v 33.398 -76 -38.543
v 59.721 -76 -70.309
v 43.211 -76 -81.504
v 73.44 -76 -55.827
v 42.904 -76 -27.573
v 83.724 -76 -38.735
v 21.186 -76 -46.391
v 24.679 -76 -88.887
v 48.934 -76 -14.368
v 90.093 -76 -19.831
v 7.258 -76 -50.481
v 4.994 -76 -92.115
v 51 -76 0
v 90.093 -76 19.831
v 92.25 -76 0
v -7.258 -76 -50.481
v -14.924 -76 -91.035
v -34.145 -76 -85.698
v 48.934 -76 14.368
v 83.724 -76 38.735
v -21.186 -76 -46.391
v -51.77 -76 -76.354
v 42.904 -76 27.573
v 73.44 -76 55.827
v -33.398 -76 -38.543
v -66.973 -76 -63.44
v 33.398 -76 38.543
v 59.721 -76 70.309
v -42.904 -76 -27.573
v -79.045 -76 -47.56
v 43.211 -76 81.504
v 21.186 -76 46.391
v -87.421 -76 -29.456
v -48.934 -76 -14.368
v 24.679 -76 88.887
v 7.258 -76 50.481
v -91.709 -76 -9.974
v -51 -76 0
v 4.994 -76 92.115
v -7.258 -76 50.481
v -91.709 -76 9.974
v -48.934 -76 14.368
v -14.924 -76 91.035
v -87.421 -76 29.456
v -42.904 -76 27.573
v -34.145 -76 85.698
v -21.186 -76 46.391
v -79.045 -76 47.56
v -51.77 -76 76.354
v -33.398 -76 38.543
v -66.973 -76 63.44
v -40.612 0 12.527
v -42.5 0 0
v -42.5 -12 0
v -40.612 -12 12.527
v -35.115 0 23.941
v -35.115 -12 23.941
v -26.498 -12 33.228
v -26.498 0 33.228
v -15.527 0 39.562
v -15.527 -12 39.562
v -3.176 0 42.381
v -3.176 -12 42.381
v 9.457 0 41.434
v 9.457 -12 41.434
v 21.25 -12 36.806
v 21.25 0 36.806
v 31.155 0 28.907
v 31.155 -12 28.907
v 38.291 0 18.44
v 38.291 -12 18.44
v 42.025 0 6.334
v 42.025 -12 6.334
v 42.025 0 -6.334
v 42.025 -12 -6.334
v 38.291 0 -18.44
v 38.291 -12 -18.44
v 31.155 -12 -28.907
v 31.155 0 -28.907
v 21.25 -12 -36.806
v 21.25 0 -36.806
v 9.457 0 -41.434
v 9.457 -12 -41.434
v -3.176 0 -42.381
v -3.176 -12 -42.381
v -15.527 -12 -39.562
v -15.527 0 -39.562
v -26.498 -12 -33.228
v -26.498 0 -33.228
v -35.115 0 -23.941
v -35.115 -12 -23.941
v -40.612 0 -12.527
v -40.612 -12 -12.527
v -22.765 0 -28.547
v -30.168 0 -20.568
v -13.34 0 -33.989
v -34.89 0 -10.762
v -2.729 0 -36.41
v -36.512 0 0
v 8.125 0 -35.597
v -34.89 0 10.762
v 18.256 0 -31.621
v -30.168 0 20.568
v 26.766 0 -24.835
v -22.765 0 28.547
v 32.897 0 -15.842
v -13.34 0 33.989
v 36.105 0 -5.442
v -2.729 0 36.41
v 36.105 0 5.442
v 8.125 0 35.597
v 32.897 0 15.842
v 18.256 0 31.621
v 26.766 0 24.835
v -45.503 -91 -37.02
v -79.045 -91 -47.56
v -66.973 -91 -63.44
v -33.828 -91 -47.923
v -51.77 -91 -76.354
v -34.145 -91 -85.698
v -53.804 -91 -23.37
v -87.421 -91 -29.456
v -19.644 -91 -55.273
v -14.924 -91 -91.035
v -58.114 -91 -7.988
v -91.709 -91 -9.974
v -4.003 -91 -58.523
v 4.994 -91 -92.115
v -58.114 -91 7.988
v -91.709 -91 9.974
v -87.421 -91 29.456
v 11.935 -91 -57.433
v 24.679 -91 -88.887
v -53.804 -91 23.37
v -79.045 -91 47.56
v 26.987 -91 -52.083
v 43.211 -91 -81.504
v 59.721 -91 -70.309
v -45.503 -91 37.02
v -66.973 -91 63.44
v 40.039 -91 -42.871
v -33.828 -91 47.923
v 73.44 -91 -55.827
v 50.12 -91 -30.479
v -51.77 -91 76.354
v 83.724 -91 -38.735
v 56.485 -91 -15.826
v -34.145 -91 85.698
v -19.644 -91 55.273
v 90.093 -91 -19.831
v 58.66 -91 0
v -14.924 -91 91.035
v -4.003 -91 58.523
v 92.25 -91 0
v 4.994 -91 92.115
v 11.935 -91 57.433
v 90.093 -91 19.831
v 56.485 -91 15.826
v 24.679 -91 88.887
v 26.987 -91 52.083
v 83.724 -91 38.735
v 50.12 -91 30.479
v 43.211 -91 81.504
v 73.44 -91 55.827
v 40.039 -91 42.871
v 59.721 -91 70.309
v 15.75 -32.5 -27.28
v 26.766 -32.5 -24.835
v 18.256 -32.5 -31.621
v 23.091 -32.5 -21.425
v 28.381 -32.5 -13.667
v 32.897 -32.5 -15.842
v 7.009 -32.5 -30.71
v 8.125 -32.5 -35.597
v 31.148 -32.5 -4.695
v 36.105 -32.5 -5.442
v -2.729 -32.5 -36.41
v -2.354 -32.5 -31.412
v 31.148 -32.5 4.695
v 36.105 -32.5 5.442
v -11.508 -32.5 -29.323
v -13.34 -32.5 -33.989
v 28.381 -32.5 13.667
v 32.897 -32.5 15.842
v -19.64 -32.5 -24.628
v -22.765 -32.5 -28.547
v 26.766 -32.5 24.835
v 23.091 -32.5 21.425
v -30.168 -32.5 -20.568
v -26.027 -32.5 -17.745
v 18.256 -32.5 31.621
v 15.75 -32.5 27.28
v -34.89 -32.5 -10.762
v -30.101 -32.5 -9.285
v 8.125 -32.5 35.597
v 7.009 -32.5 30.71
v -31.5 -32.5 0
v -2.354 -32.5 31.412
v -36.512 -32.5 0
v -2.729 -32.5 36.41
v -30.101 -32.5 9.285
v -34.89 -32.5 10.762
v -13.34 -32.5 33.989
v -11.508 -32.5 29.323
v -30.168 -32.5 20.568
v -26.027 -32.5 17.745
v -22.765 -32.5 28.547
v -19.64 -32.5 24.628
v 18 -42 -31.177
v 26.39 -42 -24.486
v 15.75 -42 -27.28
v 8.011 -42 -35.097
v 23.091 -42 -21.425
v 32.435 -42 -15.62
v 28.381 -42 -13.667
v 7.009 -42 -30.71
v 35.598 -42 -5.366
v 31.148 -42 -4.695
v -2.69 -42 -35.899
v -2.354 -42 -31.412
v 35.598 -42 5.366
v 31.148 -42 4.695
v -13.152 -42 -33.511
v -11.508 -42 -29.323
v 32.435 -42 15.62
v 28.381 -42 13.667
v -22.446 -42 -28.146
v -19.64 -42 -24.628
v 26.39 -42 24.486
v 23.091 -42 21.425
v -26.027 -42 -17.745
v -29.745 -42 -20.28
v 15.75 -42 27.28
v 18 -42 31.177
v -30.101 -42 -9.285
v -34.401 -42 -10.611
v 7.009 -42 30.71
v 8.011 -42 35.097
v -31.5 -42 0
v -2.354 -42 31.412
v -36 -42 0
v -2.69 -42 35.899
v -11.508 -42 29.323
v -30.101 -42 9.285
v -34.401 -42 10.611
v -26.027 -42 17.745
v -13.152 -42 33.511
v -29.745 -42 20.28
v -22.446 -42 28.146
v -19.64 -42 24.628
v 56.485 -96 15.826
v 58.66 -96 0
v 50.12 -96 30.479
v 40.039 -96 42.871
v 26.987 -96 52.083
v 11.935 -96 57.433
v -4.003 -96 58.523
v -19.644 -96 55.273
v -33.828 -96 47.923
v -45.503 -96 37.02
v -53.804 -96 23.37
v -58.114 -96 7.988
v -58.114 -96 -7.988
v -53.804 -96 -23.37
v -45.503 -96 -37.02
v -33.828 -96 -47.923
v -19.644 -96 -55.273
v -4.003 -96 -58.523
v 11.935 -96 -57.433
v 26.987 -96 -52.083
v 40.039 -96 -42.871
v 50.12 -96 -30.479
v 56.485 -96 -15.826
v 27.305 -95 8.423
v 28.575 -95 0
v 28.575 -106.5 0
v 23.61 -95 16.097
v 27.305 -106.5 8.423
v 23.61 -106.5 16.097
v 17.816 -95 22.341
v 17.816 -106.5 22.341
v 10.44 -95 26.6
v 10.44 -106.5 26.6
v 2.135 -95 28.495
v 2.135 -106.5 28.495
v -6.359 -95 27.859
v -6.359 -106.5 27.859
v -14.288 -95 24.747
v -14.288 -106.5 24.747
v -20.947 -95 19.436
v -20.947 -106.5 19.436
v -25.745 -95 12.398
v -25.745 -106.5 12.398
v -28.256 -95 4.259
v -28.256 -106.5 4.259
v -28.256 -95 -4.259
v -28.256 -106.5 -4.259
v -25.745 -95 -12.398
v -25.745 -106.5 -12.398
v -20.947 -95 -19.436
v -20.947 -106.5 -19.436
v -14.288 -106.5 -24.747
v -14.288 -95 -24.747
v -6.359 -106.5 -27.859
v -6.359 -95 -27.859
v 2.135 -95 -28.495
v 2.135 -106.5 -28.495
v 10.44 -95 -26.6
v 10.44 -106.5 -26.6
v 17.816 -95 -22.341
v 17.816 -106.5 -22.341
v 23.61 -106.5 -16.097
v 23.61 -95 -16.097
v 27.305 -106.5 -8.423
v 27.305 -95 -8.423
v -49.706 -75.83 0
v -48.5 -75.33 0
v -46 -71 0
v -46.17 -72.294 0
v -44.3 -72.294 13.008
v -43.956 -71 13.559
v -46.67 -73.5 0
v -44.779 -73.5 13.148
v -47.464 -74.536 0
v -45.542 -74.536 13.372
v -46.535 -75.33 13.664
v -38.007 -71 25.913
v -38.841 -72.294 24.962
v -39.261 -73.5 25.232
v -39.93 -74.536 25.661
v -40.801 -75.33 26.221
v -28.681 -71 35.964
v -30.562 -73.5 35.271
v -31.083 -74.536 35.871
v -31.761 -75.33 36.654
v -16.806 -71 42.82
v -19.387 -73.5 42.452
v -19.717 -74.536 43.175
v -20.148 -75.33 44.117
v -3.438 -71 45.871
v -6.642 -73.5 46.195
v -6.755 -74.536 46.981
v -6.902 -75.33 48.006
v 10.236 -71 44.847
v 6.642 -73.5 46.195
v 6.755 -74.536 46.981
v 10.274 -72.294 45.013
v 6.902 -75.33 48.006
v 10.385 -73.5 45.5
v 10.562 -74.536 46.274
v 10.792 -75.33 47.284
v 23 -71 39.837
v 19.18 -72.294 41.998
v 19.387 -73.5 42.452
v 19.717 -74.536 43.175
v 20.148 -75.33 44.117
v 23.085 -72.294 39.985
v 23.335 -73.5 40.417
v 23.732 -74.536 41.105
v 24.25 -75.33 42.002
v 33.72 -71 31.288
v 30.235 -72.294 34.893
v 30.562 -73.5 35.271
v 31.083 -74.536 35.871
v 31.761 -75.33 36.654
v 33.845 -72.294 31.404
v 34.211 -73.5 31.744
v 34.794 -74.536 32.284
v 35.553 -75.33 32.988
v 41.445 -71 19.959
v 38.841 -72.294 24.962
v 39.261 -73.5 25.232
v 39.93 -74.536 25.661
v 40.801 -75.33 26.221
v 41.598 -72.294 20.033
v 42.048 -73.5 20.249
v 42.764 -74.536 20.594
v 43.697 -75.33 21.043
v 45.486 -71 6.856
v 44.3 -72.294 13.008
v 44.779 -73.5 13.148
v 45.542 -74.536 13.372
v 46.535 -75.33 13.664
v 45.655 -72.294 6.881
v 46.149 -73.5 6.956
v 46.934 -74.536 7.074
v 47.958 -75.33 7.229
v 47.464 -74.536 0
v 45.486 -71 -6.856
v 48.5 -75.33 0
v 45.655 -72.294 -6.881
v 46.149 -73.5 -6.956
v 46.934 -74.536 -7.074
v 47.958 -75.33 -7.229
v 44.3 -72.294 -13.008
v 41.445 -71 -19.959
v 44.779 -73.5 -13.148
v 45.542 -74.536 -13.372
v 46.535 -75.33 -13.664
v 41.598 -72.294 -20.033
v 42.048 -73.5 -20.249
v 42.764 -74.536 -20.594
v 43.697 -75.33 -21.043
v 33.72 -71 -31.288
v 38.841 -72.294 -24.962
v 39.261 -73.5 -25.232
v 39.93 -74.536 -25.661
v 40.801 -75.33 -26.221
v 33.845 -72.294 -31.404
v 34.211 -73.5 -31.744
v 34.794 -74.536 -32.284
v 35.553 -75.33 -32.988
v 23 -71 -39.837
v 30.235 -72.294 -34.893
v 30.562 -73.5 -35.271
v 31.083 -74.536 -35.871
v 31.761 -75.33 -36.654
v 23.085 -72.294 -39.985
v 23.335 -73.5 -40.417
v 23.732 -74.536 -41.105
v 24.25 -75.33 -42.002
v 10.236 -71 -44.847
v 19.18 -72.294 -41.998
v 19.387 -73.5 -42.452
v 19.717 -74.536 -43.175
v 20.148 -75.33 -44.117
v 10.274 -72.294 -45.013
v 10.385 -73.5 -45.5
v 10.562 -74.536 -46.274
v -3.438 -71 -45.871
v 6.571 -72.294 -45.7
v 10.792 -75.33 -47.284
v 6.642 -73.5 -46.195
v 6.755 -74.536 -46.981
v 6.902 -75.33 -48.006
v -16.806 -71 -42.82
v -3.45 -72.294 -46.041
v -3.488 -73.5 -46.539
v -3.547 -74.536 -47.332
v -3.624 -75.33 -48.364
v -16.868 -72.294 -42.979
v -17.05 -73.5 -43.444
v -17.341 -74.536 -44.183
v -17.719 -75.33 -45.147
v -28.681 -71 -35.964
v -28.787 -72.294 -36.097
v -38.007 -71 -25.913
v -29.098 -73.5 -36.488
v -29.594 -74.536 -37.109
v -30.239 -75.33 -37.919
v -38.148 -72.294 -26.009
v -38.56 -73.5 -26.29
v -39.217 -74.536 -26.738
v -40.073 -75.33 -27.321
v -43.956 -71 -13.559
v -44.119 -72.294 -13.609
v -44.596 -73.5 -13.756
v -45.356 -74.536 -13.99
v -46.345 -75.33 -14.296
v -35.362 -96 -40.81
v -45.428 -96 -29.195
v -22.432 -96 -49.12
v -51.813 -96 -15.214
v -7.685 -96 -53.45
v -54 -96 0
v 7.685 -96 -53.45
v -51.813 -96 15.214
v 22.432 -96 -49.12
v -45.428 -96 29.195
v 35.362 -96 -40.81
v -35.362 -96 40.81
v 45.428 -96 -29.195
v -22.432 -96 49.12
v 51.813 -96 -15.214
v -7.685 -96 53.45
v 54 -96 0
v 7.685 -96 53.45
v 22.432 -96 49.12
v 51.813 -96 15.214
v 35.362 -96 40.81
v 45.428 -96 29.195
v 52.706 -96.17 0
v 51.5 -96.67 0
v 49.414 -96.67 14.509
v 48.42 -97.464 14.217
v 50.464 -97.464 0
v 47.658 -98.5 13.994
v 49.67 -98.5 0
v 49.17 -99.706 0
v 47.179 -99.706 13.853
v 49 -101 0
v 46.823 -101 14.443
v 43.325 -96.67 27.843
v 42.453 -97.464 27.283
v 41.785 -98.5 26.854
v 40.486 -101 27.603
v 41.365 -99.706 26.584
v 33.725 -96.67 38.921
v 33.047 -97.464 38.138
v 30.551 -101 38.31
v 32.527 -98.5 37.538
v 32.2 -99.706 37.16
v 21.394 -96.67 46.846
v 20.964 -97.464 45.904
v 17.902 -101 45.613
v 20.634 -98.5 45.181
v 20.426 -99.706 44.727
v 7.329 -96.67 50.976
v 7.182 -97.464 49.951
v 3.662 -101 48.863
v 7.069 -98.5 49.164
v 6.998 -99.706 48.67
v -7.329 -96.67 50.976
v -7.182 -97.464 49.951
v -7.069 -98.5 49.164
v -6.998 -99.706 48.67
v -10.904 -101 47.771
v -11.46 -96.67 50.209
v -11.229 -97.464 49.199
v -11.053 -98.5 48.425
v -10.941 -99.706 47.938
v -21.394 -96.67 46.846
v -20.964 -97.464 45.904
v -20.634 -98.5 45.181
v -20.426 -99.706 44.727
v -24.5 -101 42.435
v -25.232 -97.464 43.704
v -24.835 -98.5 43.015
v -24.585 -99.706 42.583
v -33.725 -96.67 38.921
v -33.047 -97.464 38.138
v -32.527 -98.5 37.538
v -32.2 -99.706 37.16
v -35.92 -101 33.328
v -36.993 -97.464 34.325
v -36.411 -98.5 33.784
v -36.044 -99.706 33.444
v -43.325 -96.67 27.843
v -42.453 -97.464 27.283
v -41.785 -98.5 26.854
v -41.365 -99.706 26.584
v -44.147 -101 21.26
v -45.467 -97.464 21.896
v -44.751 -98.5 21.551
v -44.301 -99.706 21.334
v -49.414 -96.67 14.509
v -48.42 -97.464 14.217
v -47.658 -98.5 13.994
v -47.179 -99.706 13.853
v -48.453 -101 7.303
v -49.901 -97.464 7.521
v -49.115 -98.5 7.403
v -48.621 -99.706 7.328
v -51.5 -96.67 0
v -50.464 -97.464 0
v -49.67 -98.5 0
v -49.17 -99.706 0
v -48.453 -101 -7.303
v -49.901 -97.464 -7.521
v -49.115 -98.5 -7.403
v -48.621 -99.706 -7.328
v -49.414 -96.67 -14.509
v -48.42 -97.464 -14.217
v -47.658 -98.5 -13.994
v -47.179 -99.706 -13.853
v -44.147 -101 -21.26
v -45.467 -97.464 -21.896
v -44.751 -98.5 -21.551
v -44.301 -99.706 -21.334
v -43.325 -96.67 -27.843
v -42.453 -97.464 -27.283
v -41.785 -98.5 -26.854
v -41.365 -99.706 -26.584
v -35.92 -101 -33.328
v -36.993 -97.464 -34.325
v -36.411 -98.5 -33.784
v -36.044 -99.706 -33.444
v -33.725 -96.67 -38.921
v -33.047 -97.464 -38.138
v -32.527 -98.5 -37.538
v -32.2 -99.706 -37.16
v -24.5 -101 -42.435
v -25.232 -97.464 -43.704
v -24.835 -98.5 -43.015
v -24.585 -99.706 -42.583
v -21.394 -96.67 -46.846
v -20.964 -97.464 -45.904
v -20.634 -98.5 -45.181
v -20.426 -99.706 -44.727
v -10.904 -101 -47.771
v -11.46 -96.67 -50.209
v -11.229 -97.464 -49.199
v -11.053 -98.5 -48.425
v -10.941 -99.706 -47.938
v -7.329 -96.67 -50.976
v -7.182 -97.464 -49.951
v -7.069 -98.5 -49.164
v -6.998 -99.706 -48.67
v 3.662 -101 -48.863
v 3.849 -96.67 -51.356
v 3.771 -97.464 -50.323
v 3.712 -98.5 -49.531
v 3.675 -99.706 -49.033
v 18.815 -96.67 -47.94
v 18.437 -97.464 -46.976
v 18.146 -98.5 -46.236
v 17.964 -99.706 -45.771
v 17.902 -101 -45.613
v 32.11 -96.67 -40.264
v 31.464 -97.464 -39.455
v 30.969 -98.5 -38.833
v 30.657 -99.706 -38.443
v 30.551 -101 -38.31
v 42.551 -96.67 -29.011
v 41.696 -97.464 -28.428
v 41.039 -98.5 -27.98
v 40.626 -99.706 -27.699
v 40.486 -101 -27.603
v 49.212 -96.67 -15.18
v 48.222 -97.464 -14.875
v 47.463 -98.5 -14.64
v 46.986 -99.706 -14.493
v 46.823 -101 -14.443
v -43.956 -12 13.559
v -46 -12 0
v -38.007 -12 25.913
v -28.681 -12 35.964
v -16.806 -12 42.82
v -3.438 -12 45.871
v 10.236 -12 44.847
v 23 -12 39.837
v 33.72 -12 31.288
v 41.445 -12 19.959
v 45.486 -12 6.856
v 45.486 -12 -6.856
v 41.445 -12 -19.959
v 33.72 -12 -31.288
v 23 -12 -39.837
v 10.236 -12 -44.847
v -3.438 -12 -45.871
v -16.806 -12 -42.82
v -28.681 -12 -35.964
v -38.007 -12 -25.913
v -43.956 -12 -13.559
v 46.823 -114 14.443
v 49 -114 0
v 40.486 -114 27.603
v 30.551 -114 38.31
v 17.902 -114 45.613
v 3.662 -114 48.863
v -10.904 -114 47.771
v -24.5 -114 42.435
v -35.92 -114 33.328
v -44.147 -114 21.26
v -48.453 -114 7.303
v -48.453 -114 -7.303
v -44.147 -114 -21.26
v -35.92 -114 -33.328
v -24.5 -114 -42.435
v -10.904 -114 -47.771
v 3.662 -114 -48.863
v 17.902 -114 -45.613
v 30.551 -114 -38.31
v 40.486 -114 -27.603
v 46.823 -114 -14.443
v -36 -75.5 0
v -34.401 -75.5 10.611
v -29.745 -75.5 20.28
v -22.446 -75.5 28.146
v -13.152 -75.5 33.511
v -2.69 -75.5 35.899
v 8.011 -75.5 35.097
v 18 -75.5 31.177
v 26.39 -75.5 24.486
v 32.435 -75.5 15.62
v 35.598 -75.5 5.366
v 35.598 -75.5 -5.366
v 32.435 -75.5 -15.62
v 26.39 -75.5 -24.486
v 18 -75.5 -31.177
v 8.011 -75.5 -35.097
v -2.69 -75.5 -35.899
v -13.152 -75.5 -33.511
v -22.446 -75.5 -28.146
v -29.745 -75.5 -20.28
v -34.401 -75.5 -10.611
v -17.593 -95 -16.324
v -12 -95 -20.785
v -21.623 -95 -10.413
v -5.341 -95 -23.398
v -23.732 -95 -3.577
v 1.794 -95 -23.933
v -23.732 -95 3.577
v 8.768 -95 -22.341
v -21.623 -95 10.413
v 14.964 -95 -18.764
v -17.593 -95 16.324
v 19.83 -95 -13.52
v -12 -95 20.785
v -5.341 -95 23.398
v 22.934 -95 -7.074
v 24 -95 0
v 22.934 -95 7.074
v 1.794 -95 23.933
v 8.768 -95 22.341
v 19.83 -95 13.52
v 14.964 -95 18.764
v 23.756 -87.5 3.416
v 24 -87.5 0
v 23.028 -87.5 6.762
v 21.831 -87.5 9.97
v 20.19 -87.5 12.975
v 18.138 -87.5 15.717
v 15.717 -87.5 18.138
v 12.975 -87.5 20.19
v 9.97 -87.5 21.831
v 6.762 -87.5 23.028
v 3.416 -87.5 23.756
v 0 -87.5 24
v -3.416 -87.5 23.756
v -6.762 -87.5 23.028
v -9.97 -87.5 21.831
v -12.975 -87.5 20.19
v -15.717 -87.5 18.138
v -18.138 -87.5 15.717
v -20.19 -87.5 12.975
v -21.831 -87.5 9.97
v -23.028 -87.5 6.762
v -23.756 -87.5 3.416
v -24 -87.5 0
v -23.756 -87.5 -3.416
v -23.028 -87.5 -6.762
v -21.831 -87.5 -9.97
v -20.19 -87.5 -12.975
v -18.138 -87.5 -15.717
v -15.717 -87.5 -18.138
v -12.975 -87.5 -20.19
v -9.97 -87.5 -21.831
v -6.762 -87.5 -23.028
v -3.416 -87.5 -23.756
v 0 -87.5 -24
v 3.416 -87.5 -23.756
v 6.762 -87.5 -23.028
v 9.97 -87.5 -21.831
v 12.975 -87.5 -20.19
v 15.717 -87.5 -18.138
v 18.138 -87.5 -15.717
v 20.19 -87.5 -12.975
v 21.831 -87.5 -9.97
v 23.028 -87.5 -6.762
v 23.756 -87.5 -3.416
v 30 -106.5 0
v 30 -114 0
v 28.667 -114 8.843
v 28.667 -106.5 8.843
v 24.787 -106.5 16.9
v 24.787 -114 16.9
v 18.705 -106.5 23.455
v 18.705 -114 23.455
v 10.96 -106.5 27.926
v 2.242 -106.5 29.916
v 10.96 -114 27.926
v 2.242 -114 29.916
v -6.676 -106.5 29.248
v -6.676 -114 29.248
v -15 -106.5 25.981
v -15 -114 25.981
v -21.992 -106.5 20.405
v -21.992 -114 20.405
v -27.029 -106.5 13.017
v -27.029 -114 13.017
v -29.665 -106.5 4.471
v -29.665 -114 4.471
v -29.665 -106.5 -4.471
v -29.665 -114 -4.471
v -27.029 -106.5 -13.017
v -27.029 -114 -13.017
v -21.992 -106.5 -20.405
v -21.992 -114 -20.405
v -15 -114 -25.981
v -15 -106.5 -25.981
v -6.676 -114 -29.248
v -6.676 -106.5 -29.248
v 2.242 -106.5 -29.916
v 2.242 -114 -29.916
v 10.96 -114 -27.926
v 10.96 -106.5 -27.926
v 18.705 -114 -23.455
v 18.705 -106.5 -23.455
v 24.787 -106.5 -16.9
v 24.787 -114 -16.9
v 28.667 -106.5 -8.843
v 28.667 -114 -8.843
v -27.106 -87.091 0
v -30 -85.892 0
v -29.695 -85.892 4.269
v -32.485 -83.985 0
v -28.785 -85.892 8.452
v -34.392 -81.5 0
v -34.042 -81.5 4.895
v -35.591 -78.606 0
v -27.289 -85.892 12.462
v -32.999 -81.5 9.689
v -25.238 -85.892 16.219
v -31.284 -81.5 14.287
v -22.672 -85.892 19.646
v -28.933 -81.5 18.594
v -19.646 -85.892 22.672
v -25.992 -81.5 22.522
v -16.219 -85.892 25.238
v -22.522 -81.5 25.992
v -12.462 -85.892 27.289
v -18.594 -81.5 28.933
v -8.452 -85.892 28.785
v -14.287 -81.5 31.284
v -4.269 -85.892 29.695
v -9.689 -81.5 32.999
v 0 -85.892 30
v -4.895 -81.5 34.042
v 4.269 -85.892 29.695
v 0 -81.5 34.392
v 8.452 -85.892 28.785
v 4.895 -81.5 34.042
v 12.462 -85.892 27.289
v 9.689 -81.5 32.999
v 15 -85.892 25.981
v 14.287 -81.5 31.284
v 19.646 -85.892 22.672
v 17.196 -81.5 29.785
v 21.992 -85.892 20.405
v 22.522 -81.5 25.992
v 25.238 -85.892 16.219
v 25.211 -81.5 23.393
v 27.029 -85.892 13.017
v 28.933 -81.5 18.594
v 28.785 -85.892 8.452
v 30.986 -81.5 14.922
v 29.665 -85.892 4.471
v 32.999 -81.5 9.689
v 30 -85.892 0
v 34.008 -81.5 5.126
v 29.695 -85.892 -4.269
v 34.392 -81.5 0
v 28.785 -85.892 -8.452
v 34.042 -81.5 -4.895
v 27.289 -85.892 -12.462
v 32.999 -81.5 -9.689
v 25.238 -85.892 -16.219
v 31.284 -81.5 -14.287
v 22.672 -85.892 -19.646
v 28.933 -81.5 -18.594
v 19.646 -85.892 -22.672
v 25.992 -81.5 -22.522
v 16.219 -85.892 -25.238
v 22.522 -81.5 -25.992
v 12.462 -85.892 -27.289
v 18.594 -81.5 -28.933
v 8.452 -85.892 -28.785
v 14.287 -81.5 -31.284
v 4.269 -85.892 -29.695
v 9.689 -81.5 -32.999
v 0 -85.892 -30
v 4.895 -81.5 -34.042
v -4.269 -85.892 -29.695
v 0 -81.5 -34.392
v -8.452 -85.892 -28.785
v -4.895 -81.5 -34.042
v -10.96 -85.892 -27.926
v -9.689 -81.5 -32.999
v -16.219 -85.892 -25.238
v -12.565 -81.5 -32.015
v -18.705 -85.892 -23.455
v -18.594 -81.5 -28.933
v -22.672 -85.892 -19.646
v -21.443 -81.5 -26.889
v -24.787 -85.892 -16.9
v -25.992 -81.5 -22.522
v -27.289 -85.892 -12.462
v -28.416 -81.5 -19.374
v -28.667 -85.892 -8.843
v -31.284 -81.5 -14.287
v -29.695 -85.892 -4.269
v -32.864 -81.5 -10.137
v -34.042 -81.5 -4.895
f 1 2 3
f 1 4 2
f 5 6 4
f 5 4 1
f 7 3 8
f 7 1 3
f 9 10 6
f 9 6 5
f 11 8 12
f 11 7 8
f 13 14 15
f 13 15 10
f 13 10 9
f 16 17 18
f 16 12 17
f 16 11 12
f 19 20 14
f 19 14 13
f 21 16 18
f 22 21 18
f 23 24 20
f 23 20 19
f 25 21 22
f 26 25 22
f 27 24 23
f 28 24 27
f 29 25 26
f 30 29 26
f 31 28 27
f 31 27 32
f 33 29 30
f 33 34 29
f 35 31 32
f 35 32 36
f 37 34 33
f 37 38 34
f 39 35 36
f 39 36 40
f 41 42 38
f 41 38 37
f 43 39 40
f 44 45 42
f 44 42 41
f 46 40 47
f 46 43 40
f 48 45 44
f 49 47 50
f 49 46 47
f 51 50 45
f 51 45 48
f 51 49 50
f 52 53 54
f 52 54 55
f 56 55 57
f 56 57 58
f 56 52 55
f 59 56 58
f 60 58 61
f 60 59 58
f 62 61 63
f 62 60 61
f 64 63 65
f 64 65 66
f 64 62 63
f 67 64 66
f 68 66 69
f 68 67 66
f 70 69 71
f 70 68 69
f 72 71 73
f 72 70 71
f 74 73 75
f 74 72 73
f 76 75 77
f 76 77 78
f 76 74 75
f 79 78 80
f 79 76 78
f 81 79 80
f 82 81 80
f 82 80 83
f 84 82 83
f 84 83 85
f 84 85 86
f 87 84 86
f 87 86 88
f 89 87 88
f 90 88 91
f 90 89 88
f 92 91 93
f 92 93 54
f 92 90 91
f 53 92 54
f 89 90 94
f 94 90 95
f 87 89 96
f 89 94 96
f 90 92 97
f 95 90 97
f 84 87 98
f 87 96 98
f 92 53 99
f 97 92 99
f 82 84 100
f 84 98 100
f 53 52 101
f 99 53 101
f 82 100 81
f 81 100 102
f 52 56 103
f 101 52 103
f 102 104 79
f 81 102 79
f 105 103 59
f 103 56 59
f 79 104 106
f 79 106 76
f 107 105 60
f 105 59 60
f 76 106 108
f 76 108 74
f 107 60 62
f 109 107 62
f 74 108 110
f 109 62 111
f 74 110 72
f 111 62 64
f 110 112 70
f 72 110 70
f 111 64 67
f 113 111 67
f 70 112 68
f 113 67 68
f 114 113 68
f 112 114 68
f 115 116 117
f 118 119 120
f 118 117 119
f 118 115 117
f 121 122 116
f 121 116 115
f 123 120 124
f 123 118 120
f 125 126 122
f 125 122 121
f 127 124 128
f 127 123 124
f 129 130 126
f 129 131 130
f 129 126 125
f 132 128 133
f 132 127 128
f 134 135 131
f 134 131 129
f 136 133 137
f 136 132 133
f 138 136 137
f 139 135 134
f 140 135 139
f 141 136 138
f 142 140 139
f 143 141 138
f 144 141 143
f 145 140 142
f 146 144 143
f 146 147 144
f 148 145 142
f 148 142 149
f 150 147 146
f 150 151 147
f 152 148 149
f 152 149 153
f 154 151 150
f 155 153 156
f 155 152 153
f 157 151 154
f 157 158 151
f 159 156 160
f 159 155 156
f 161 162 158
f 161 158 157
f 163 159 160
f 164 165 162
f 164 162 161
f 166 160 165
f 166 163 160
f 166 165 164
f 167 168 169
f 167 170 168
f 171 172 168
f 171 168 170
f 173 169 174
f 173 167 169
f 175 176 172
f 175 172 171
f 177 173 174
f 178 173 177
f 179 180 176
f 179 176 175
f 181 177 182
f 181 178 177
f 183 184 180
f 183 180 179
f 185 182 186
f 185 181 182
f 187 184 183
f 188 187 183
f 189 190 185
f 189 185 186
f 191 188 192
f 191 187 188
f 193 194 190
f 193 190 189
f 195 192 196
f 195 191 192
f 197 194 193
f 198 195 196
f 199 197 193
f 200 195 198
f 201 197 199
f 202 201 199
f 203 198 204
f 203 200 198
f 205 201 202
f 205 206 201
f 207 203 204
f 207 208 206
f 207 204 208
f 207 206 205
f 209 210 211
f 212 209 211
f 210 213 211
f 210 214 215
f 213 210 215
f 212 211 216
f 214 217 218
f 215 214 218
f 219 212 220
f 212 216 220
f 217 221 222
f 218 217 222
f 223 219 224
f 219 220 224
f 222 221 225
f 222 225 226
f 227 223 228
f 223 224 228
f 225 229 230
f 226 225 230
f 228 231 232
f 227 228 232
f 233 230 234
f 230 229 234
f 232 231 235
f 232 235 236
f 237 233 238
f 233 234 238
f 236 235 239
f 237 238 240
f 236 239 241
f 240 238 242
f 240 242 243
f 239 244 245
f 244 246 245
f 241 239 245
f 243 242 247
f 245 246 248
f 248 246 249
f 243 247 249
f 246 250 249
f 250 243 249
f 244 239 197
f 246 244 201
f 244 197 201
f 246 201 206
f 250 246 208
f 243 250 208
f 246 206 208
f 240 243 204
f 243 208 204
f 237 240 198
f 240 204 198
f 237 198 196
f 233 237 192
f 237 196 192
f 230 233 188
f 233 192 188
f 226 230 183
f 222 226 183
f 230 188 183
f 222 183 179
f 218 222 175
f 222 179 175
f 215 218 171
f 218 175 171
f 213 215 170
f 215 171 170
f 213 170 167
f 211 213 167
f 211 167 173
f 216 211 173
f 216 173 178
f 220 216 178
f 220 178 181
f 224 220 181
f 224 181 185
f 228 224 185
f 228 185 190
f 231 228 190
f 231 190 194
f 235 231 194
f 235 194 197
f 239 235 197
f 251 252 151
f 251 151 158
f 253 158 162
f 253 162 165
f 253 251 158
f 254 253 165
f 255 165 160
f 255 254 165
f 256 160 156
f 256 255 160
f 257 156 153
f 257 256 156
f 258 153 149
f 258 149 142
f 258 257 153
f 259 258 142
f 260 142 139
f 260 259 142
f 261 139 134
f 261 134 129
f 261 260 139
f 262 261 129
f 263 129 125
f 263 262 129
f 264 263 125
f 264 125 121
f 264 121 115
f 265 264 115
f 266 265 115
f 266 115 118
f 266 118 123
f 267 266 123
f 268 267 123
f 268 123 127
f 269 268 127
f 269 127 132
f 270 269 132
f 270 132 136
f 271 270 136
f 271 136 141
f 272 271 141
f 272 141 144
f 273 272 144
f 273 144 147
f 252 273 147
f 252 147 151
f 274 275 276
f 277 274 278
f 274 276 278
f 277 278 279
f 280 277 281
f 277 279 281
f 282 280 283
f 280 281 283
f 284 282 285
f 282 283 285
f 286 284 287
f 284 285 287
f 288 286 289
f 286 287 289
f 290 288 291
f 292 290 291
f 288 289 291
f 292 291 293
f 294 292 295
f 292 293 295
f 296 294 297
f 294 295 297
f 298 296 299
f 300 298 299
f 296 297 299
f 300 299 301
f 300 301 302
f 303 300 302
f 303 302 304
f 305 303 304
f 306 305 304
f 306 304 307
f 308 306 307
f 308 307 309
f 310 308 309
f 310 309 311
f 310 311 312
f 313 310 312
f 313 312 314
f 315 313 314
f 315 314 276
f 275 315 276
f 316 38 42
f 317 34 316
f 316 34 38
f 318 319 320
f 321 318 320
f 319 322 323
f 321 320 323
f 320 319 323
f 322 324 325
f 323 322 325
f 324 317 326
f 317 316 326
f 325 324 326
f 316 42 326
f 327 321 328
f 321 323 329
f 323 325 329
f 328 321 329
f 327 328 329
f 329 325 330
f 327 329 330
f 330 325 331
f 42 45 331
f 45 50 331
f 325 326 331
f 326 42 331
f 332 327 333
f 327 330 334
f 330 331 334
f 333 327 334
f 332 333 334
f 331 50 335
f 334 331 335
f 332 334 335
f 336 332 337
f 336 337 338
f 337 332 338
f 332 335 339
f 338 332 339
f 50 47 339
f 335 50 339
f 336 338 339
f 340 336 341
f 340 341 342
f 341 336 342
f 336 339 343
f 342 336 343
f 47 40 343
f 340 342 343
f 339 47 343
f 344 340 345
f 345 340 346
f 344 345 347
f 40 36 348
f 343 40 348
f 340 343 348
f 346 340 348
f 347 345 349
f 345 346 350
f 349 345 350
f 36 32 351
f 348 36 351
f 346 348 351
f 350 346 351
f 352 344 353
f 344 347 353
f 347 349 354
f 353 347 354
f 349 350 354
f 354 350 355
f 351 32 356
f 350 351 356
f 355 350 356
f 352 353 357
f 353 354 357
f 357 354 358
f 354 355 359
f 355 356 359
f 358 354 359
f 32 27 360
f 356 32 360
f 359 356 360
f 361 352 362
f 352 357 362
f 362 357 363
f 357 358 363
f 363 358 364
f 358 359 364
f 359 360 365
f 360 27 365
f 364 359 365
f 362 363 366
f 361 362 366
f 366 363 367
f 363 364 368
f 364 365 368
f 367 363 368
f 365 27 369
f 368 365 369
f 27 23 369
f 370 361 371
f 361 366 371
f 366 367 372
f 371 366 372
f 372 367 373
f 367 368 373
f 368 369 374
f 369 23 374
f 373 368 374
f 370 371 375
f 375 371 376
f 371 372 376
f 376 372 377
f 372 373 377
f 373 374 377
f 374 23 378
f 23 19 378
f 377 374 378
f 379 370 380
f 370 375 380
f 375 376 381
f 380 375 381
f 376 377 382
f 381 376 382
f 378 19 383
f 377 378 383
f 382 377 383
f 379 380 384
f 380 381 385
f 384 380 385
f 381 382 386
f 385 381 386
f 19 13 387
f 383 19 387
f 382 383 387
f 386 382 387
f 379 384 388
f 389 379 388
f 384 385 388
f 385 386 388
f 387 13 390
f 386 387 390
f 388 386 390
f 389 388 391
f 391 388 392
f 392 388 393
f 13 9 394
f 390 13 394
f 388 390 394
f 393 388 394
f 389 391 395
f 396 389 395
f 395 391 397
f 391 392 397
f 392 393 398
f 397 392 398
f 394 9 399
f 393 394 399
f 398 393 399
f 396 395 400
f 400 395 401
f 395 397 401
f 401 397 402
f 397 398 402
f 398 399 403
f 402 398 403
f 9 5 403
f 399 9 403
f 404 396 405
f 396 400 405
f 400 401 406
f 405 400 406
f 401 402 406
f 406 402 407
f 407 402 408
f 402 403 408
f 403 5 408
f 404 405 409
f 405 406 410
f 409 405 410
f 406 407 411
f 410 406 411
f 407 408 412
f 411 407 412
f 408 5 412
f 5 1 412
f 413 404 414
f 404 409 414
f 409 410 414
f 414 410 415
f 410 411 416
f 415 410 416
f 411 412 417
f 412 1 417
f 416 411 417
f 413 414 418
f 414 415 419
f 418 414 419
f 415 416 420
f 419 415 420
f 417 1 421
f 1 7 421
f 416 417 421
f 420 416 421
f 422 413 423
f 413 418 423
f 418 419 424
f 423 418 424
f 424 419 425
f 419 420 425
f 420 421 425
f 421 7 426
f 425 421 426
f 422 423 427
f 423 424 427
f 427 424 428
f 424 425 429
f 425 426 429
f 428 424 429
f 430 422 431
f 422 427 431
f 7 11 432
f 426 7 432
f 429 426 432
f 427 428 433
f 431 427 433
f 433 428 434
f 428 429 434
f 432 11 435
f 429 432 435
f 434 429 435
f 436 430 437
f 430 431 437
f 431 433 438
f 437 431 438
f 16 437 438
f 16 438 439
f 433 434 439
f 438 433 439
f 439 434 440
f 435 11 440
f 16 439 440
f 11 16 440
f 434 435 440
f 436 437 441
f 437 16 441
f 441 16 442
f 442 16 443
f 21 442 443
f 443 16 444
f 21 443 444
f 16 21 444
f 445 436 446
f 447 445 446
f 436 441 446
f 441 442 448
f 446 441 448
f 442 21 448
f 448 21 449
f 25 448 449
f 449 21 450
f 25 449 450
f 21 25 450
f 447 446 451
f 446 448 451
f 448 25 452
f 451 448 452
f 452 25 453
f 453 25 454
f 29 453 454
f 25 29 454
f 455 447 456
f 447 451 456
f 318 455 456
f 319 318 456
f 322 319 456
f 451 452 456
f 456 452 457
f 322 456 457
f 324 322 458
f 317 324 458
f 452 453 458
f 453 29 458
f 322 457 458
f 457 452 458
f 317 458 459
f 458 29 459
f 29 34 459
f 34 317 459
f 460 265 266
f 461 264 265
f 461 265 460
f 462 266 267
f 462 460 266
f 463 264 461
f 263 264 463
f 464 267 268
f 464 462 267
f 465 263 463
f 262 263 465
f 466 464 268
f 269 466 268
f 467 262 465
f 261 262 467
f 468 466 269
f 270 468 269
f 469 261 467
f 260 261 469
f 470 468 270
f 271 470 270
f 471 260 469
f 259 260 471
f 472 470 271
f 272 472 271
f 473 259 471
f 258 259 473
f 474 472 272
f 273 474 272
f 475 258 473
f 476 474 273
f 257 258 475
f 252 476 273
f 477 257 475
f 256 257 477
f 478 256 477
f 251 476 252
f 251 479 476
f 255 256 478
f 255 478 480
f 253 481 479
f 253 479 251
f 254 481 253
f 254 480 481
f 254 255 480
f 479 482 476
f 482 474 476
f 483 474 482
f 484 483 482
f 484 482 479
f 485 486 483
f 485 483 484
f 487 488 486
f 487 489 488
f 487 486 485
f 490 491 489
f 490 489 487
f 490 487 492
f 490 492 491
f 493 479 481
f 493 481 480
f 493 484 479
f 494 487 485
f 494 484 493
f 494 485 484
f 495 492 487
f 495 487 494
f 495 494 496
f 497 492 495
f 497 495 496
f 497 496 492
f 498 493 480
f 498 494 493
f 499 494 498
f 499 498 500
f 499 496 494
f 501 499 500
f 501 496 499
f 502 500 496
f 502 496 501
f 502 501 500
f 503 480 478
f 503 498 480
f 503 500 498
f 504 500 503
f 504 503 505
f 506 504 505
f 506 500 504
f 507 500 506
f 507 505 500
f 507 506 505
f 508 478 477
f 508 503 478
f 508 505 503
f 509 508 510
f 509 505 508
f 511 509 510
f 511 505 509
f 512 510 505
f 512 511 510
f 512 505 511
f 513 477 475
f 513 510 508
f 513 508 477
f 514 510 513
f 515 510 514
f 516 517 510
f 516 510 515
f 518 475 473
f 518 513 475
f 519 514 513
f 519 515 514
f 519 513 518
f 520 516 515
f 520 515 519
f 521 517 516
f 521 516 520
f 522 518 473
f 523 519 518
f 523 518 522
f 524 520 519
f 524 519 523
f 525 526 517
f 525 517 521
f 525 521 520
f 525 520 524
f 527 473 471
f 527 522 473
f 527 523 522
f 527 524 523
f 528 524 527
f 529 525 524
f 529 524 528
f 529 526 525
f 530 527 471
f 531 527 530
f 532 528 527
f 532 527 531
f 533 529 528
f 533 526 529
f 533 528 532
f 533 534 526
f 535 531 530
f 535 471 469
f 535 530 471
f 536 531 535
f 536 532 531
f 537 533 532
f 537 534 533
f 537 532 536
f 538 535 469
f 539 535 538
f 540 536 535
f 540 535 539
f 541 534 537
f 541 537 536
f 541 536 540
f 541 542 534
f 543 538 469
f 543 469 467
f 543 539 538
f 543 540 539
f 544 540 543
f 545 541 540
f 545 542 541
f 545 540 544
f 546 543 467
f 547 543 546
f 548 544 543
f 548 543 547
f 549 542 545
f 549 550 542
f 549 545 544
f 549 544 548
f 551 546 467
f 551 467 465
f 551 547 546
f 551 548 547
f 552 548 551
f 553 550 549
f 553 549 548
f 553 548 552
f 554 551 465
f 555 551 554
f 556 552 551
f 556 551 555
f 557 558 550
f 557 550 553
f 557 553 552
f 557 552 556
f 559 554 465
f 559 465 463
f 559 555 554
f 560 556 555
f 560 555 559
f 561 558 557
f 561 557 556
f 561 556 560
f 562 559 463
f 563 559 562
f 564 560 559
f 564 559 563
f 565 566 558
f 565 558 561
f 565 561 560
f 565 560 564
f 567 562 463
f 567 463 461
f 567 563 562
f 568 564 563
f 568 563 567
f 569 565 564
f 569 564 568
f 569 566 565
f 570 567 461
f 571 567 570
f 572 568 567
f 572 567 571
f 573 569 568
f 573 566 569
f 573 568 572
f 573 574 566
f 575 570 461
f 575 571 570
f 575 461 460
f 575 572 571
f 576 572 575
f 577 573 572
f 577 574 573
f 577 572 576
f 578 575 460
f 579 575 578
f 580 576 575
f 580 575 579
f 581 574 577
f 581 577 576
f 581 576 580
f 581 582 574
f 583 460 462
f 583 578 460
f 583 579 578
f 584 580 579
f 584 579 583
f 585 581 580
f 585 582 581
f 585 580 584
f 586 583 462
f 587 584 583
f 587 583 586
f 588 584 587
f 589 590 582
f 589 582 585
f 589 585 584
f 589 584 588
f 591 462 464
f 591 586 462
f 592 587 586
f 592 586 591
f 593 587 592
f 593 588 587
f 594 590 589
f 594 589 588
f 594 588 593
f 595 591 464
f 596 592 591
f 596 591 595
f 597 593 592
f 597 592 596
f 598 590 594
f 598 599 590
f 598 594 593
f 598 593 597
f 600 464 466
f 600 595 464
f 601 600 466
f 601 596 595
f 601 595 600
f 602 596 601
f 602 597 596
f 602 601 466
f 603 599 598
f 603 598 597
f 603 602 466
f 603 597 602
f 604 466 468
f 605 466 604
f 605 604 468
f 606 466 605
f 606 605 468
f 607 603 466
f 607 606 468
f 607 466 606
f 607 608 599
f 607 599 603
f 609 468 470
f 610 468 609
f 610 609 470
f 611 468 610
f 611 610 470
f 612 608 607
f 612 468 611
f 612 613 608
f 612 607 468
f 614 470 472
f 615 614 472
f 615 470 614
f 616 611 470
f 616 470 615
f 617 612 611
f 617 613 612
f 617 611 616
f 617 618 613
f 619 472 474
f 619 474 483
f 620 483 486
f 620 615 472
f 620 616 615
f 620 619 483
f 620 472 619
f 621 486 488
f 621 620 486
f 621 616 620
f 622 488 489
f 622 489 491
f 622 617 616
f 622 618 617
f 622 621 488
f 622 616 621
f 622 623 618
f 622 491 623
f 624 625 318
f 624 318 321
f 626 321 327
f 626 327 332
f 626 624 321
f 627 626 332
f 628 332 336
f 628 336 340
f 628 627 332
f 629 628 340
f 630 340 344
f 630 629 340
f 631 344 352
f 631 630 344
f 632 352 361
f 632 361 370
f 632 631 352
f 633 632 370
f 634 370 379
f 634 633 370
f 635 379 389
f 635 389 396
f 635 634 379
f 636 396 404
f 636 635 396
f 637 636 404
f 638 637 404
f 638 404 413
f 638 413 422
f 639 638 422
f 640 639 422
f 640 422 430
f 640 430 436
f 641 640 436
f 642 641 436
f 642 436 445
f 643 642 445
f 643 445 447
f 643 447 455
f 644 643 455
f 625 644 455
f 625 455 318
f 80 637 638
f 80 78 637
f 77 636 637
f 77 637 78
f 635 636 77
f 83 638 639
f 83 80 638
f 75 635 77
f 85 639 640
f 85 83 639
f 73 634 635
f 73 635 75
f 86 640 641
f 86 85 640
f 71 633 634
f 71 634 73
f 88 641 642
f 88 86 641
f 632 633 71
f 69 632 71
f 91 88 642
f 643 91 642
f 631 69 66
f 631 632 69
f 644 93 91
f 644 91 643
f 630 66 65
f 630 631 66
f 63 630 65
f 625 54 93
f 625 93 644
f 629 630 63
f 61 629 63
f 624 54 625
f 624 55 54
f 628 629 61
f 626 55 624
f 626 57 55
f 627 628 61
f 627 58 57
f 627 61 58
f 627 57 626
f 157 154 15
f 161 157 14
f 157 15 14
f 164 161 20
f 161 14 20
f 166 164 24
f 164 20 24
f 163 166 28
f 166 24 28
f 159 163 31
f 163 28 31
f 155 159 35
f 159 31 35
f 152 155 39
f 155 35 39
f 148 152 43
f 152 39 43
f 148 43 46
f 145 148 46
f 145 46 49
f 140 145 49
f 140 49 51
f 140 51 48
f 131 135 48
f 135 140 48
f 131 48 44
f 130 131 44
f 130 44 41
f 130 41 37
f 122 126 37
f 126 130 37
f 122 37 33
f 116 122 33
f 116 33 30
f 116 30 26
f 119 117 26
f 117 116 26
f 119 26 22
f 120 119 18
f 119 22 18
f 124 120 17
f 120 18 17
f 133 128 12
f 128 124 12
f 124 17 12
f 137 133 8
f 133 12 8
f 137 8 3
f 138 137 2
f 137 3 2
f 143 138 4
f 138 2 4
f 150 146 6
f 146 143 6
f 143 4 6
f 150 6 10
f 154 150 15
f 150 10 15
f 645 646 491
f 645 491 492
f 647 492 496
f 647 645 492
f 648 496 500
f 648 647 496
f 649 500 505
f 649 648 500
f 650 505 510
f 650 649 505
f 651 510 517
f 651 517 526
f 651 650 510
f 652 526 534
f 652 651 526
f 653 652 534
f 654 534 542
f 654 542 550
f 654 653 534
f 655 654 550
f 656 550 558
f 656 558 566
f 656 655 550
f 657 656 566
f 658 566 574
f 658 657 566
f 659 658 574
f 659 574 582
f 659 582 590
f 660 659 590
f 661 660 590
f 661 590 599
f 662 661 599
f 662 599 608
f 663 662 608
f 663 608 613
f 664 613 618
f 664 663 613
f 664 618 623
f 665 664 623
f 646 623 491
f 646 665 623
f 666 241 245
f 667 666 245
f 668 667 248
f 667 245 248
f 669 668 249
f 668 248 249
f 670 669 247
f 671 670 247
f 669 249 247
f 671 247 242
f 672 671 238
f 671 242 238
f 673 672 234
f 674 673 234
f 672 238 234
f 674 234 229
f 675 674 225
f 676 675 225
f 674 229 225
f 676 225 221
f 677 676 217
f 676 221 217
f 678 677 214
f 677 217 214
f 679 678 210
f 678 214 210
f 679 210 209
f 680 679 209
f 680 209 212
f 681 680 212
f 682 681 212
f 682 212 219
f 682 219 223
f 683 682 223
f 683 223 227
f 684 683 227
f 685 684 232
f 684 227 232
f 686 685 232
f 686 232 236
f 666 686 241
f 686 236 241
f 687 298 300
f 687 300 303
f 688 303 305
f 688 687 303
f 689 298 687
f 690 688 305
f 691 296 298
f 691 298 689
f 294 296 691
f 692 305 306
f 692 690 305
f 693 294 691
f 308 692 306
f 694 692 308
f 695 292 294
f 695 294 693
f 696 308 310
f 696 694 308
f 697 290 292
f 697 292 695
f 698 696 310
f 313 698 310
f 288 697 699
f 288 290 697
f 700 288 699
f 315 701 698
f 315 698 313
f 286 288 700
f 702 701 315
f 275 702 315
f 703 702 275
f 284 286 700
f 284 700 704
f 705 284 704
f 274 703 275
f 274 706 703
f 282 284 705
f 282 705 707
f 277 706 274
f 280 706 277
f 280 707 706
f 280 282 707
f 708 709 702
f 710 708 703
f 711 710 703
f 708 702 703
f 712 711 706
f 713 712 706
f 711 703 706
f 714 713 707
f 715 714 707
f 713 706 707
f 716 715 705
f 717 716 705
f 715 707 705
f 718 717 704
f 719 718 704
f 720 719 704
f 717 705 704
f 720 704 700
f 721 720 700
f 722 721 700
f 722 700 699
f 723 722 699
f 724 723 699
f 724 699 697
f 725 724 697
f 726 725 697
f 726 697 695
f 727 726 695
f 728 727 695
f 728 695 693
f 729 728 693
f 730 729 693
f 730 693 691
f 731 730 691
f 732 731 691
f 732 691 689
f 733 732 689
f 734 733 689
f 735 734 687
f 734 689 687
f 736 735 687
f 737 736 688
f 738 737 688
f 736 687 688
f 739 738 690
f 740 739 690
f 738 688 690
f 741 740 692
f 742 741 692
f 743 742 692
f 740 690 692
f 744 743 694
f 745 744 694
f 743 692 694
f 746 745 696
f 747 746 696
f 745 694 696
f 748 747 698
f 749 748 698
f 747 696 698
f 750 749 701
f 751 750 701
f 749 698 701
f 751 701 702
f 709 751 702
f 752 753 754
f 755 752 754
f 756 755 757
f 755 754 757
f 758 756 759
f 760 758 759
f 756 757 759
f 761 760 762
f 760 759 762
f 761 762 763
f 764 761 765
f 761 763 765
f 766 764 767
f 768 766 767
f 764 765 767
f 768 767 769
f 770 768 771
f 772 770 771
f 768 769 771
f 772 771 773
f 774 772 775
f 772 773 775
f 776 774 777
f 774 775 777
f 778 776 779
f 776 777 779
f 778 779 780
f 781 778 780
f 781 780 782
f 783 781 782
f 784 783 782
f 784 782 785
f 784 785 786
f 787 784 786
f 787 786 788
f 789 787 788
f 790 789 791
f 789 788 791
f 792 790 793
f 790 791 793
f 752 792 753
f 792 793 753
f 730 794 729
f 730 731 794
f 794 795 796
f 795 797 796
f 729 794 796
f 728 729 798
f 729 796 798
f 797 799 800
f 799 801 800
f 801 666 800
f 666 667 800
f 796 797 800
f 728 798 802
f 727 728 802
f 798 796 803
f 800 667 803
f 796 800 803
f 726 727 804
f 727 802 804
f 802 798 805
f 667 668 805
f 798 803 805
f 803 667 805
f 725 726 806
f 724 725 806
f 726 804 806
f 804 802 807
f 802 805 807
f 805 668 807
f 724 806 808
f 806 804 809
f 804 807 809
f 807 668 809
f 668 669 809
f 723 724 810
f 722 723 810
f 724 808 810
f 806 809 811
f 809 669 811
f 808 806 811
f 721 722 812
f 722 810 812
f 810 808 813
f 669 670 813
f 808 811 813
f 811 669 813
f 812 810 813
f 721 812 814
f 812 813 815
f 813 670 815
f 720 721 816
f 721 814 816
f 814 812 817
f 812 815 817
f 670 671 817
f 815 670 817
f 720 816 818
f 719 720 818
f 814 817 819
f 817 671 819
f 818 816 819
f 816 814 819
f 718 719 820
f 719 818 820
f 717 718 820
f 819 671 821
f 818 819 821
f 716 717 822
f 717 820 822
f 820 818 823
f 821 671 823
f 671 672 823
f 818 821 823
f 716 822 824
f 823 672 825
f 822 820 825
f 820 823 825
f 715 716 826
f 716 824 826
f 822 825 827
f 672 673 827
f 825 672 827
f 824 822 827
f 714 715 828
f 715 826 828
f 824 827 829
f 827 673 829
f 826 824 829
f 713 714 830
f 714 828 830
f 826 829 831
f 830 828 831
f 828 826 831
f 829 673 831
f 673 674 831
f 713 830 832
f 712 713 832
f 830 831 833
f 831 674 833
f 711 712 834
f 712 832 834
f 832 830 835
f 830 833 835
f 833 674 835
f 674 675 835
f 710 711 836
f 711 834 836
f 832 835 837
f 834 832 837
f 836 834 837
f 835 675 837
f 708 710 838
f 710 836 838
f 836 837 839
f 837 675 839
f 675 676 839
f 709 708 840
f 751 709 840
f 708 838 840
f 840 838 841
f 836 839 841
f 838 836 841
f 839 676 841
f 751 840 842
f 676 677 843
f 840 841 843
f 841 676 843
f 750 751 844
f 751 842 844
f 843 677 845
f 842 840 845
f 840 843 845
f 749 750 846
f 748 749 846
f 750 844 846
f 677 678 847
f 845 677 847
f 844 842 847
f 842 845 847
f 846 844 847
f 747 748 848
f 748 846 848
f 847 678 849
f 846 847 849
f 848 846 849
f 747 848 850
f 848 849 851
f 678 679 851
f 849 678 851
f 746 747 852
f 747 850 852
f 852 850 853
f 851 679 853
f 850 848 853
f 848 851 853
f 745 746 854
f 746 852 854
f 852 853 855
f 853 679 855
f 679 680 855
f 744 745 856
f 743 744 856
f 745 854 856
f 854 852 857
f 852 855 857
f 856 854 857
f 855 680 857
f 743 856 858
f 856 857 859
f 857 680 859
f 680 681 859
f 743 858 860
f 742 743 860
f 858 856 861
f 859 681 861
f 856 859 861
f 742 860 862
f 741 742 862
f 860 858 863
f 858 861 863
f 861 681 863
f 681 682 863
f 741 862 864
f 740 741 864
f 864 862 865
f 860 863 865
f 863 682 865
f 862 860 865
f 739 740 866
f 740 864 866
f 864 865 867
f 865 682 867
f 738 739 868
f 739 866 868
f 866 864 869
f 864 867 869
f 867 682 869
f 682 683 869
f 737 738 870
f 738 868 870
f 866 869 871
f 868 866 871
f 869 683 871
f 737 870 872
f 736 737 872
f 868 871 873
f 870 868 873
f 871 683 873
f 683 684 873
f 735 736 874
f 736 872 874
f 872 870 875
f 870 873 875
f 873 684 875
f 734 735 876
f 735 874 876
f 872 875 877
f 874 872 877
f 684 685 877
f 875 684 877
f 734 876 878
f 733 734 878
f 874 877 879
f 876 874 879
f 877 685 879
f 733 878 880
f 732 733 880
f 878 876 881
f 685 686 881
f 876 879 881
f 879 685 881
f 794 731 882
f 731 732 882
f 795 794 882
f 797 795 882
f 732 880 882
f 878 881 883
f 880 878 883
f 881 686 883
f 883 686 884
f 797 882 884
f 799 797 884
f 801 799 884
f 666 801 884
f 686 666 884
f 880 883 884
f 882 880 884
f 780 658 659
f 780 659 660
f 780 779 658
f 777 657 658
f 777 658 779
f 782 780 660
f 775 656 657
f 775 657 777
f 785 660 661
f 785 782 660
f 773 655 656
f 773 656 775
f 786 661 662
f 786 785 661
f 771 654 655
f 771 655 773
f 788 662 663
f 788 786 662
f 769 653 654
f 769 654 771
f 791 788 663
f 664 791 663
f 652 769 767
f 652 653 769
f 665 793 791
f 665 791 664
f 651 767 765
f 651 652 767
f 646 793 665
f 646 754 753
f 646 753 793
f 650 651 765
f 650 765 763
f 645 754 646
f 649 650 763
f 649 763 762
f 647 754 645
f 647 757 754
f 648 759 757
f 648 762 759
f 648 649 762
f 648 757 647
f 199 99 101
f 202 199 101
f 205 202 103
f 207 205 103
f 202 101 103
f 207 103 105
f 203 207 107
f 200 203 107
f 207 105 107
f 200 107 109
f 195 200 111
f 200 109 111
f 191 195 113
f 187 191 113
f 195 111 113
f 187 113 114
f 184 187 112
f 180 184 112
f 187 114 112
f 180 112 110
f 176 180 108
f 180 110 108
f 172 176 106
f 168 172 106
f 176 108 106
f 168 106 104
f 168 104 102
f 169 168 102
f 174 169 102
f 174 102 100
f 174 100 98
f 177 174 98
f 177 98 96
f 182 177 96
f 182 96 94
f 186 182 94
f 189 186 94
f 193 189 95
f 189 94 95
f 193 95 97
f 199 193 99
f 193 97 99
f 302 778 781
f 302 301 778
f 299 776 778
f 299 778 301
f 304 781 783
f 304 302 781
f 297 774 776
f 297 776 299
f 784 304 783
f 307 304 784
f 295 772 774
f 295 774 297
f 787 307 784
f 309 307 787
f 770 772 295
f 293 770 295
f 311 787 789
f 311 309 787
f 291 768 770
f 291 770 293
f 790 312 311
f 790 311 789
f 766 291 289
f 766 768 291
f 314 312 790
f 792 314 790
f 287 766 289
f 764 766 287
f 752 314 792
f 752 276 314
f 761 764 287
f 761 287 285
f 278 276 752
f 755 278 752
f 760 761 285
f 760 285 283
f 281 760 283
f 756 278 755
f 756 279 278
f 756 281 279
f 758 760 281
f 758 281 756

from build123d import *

# Parameters (mm, degrees)
F0_R      = 92.25
F1_DEPTH  = 114
F2_R      = 92.25
F2_R_2    = 49
F3_DEPTH  = 18
F4_R      = 5
F5_R      = 24
F6_DEPTH  = 26.5
F7_R      = 28.575
F8_DEPTH  = 19
F9_R      = 30
F10_DEPTH = 7.5
F11_R     = 92.25
F11_R_2   = 46
F12_DEPTH = 76
F13_R     = 46
F13_R_2   = 42.5
F14_DEPTH = 12
F15_R     = 31.5
F16_DEPTH = 42
F17_R     = 36.5125
F18_DEPTH = 32.5
F19_R     = 36
F20_DEPTH = 45.5
F21_R     = 11.99999
F22_R     = 5
F23_R     = 92.75
F23_R_2   = 58.66
F24_DEPTH = 23


# Not quite as in the source:
# - a fillet or chamfer is up to 0.001 mm smaller than in the source, because OpenCascade refuses the exact size


with BuildPart() as f1:
    # F0 (on Front) → F1 (new body)
    with BuildSketch(Plane.XZ):
        Circle(F0_R)
    extrude(amount=F1_DEPTH)

    # F2 (on face) → F3 (cut)
    with BuildSketch(Plane.XZ.offset(114)):
        Circle(F2_R)
        Circle(F2_R_2, mode=Mode.SUBTRACT)
    extrude(amount=-F3_DEPTH, mode=Mode.SUBTRACT)

    # F4
    f4_edges = [f1.edges().sort_by_distance(p)[0] for p in [
        (-49, -96, 0),
    ]]
    fillet(f4_edges, radius=F4_R)

    # F5 (on face) → F6 (cut)
    with BuildSketch(Plane.XZ.offset(114)):
        Circle(F5_R)
    extrude(amount=-F6_DEPTH, mode=Mode.SUBTRACT)

    # F7 (on face) → F8 (cut)
    with BuildSketch(Plane.XZ.offset(114)):
        Circle(F7_R)
    extrude(amount=-F8_DEPTH, mode=Mode.SUBTRACT)

    # F9 (on face) → F10 (cut)
    with BuildSketch(Plane.XZ.offset(114)):
        Circle(F9_R)
    extrude(amount=-F10_DEPTH, mode=Mode.SUBTRACT)

    # F11 (on face) → F12 (cut)
    with BuildSketch(Plane(origin=(0, 0, 0), x_dir=(-1, 0, 0), z_dir=(0, 1, 0))):
        Circle(F11_R)
        Circle(F11_R_2, mode=Mode.SUBTRACT)
    extrude(amount=-F12_DEPTH, mode=Mode.SUBTRACT)

    # F13 (on face) → F14 (cut)
    with BuildSketch(Plane(origin=(0, 0, 0), x_dir=(-1, 0, 0), z_dir=(0, 1, 0))):
        Circle(F13_R)
        Circle(F13_R_2, mode=Mode.SUBTRACT)
    extrude(amount=-F14_DEPTH, mode=Mode.SUBTRACT)

    # F15 (on face) → F16 (cut)
    with BuildSketch(Plane(origin=(0, 0, 0), x_dir=(-1, 0, 0), z_dir=(0, 1, 0))):
        Circle(F15_R)
    extrude(amount=-F16_DEPTH, mode=Mode.SUBTRACT)

    # F17 (on face) → F18 (cut)
    with BuildSketch(Plane(origin=(0, 0, 0), x_dir=(-1, 0, 0), z_dir=(0, 1, 0))):
        Circle(F17_R)
    extrude(amount=-F18_DEPTH, mode=Mode.SUBTRACT)

    # F19 (on face) → F20 (cut)
    with BuildSketch(Plane(origin=(0, -42, 0), x_dir=(-1, 0, 0), z_dir=(0, 1, 0))):
        Circle(F19_R)
    extrude(amount=-F20_DEPTH, mode=Mode.SUBTRACT)

    # F21 (radius 12 in the source; OpenCascade refuses exactly that, so slightly less here)
    f21_edges = [f1.edges().sort_by_distance(p)[0] for p in [
        (36, -87.5, 0),
    ]]
    fillet(f21_edges, radius=F21_R)

    # F22
    f22_edges = [f1.edges().sort_by_distance(p)[0] for p in [
        (46, -76, 0),
    ]]
    fillet(f22_edges, radius=F22_R)

    # F23 (on face) → F24 (cut)
    with BuildSketch(Plane.XZ.offset(114)):
        Circle(F23_R)
        Circle(F23_R_2, mode=Mode.SUBTRACT)
    extrude(amount=-F24_DEPTH, mode=Mode.SUBTRACT)


solid = f1.part
